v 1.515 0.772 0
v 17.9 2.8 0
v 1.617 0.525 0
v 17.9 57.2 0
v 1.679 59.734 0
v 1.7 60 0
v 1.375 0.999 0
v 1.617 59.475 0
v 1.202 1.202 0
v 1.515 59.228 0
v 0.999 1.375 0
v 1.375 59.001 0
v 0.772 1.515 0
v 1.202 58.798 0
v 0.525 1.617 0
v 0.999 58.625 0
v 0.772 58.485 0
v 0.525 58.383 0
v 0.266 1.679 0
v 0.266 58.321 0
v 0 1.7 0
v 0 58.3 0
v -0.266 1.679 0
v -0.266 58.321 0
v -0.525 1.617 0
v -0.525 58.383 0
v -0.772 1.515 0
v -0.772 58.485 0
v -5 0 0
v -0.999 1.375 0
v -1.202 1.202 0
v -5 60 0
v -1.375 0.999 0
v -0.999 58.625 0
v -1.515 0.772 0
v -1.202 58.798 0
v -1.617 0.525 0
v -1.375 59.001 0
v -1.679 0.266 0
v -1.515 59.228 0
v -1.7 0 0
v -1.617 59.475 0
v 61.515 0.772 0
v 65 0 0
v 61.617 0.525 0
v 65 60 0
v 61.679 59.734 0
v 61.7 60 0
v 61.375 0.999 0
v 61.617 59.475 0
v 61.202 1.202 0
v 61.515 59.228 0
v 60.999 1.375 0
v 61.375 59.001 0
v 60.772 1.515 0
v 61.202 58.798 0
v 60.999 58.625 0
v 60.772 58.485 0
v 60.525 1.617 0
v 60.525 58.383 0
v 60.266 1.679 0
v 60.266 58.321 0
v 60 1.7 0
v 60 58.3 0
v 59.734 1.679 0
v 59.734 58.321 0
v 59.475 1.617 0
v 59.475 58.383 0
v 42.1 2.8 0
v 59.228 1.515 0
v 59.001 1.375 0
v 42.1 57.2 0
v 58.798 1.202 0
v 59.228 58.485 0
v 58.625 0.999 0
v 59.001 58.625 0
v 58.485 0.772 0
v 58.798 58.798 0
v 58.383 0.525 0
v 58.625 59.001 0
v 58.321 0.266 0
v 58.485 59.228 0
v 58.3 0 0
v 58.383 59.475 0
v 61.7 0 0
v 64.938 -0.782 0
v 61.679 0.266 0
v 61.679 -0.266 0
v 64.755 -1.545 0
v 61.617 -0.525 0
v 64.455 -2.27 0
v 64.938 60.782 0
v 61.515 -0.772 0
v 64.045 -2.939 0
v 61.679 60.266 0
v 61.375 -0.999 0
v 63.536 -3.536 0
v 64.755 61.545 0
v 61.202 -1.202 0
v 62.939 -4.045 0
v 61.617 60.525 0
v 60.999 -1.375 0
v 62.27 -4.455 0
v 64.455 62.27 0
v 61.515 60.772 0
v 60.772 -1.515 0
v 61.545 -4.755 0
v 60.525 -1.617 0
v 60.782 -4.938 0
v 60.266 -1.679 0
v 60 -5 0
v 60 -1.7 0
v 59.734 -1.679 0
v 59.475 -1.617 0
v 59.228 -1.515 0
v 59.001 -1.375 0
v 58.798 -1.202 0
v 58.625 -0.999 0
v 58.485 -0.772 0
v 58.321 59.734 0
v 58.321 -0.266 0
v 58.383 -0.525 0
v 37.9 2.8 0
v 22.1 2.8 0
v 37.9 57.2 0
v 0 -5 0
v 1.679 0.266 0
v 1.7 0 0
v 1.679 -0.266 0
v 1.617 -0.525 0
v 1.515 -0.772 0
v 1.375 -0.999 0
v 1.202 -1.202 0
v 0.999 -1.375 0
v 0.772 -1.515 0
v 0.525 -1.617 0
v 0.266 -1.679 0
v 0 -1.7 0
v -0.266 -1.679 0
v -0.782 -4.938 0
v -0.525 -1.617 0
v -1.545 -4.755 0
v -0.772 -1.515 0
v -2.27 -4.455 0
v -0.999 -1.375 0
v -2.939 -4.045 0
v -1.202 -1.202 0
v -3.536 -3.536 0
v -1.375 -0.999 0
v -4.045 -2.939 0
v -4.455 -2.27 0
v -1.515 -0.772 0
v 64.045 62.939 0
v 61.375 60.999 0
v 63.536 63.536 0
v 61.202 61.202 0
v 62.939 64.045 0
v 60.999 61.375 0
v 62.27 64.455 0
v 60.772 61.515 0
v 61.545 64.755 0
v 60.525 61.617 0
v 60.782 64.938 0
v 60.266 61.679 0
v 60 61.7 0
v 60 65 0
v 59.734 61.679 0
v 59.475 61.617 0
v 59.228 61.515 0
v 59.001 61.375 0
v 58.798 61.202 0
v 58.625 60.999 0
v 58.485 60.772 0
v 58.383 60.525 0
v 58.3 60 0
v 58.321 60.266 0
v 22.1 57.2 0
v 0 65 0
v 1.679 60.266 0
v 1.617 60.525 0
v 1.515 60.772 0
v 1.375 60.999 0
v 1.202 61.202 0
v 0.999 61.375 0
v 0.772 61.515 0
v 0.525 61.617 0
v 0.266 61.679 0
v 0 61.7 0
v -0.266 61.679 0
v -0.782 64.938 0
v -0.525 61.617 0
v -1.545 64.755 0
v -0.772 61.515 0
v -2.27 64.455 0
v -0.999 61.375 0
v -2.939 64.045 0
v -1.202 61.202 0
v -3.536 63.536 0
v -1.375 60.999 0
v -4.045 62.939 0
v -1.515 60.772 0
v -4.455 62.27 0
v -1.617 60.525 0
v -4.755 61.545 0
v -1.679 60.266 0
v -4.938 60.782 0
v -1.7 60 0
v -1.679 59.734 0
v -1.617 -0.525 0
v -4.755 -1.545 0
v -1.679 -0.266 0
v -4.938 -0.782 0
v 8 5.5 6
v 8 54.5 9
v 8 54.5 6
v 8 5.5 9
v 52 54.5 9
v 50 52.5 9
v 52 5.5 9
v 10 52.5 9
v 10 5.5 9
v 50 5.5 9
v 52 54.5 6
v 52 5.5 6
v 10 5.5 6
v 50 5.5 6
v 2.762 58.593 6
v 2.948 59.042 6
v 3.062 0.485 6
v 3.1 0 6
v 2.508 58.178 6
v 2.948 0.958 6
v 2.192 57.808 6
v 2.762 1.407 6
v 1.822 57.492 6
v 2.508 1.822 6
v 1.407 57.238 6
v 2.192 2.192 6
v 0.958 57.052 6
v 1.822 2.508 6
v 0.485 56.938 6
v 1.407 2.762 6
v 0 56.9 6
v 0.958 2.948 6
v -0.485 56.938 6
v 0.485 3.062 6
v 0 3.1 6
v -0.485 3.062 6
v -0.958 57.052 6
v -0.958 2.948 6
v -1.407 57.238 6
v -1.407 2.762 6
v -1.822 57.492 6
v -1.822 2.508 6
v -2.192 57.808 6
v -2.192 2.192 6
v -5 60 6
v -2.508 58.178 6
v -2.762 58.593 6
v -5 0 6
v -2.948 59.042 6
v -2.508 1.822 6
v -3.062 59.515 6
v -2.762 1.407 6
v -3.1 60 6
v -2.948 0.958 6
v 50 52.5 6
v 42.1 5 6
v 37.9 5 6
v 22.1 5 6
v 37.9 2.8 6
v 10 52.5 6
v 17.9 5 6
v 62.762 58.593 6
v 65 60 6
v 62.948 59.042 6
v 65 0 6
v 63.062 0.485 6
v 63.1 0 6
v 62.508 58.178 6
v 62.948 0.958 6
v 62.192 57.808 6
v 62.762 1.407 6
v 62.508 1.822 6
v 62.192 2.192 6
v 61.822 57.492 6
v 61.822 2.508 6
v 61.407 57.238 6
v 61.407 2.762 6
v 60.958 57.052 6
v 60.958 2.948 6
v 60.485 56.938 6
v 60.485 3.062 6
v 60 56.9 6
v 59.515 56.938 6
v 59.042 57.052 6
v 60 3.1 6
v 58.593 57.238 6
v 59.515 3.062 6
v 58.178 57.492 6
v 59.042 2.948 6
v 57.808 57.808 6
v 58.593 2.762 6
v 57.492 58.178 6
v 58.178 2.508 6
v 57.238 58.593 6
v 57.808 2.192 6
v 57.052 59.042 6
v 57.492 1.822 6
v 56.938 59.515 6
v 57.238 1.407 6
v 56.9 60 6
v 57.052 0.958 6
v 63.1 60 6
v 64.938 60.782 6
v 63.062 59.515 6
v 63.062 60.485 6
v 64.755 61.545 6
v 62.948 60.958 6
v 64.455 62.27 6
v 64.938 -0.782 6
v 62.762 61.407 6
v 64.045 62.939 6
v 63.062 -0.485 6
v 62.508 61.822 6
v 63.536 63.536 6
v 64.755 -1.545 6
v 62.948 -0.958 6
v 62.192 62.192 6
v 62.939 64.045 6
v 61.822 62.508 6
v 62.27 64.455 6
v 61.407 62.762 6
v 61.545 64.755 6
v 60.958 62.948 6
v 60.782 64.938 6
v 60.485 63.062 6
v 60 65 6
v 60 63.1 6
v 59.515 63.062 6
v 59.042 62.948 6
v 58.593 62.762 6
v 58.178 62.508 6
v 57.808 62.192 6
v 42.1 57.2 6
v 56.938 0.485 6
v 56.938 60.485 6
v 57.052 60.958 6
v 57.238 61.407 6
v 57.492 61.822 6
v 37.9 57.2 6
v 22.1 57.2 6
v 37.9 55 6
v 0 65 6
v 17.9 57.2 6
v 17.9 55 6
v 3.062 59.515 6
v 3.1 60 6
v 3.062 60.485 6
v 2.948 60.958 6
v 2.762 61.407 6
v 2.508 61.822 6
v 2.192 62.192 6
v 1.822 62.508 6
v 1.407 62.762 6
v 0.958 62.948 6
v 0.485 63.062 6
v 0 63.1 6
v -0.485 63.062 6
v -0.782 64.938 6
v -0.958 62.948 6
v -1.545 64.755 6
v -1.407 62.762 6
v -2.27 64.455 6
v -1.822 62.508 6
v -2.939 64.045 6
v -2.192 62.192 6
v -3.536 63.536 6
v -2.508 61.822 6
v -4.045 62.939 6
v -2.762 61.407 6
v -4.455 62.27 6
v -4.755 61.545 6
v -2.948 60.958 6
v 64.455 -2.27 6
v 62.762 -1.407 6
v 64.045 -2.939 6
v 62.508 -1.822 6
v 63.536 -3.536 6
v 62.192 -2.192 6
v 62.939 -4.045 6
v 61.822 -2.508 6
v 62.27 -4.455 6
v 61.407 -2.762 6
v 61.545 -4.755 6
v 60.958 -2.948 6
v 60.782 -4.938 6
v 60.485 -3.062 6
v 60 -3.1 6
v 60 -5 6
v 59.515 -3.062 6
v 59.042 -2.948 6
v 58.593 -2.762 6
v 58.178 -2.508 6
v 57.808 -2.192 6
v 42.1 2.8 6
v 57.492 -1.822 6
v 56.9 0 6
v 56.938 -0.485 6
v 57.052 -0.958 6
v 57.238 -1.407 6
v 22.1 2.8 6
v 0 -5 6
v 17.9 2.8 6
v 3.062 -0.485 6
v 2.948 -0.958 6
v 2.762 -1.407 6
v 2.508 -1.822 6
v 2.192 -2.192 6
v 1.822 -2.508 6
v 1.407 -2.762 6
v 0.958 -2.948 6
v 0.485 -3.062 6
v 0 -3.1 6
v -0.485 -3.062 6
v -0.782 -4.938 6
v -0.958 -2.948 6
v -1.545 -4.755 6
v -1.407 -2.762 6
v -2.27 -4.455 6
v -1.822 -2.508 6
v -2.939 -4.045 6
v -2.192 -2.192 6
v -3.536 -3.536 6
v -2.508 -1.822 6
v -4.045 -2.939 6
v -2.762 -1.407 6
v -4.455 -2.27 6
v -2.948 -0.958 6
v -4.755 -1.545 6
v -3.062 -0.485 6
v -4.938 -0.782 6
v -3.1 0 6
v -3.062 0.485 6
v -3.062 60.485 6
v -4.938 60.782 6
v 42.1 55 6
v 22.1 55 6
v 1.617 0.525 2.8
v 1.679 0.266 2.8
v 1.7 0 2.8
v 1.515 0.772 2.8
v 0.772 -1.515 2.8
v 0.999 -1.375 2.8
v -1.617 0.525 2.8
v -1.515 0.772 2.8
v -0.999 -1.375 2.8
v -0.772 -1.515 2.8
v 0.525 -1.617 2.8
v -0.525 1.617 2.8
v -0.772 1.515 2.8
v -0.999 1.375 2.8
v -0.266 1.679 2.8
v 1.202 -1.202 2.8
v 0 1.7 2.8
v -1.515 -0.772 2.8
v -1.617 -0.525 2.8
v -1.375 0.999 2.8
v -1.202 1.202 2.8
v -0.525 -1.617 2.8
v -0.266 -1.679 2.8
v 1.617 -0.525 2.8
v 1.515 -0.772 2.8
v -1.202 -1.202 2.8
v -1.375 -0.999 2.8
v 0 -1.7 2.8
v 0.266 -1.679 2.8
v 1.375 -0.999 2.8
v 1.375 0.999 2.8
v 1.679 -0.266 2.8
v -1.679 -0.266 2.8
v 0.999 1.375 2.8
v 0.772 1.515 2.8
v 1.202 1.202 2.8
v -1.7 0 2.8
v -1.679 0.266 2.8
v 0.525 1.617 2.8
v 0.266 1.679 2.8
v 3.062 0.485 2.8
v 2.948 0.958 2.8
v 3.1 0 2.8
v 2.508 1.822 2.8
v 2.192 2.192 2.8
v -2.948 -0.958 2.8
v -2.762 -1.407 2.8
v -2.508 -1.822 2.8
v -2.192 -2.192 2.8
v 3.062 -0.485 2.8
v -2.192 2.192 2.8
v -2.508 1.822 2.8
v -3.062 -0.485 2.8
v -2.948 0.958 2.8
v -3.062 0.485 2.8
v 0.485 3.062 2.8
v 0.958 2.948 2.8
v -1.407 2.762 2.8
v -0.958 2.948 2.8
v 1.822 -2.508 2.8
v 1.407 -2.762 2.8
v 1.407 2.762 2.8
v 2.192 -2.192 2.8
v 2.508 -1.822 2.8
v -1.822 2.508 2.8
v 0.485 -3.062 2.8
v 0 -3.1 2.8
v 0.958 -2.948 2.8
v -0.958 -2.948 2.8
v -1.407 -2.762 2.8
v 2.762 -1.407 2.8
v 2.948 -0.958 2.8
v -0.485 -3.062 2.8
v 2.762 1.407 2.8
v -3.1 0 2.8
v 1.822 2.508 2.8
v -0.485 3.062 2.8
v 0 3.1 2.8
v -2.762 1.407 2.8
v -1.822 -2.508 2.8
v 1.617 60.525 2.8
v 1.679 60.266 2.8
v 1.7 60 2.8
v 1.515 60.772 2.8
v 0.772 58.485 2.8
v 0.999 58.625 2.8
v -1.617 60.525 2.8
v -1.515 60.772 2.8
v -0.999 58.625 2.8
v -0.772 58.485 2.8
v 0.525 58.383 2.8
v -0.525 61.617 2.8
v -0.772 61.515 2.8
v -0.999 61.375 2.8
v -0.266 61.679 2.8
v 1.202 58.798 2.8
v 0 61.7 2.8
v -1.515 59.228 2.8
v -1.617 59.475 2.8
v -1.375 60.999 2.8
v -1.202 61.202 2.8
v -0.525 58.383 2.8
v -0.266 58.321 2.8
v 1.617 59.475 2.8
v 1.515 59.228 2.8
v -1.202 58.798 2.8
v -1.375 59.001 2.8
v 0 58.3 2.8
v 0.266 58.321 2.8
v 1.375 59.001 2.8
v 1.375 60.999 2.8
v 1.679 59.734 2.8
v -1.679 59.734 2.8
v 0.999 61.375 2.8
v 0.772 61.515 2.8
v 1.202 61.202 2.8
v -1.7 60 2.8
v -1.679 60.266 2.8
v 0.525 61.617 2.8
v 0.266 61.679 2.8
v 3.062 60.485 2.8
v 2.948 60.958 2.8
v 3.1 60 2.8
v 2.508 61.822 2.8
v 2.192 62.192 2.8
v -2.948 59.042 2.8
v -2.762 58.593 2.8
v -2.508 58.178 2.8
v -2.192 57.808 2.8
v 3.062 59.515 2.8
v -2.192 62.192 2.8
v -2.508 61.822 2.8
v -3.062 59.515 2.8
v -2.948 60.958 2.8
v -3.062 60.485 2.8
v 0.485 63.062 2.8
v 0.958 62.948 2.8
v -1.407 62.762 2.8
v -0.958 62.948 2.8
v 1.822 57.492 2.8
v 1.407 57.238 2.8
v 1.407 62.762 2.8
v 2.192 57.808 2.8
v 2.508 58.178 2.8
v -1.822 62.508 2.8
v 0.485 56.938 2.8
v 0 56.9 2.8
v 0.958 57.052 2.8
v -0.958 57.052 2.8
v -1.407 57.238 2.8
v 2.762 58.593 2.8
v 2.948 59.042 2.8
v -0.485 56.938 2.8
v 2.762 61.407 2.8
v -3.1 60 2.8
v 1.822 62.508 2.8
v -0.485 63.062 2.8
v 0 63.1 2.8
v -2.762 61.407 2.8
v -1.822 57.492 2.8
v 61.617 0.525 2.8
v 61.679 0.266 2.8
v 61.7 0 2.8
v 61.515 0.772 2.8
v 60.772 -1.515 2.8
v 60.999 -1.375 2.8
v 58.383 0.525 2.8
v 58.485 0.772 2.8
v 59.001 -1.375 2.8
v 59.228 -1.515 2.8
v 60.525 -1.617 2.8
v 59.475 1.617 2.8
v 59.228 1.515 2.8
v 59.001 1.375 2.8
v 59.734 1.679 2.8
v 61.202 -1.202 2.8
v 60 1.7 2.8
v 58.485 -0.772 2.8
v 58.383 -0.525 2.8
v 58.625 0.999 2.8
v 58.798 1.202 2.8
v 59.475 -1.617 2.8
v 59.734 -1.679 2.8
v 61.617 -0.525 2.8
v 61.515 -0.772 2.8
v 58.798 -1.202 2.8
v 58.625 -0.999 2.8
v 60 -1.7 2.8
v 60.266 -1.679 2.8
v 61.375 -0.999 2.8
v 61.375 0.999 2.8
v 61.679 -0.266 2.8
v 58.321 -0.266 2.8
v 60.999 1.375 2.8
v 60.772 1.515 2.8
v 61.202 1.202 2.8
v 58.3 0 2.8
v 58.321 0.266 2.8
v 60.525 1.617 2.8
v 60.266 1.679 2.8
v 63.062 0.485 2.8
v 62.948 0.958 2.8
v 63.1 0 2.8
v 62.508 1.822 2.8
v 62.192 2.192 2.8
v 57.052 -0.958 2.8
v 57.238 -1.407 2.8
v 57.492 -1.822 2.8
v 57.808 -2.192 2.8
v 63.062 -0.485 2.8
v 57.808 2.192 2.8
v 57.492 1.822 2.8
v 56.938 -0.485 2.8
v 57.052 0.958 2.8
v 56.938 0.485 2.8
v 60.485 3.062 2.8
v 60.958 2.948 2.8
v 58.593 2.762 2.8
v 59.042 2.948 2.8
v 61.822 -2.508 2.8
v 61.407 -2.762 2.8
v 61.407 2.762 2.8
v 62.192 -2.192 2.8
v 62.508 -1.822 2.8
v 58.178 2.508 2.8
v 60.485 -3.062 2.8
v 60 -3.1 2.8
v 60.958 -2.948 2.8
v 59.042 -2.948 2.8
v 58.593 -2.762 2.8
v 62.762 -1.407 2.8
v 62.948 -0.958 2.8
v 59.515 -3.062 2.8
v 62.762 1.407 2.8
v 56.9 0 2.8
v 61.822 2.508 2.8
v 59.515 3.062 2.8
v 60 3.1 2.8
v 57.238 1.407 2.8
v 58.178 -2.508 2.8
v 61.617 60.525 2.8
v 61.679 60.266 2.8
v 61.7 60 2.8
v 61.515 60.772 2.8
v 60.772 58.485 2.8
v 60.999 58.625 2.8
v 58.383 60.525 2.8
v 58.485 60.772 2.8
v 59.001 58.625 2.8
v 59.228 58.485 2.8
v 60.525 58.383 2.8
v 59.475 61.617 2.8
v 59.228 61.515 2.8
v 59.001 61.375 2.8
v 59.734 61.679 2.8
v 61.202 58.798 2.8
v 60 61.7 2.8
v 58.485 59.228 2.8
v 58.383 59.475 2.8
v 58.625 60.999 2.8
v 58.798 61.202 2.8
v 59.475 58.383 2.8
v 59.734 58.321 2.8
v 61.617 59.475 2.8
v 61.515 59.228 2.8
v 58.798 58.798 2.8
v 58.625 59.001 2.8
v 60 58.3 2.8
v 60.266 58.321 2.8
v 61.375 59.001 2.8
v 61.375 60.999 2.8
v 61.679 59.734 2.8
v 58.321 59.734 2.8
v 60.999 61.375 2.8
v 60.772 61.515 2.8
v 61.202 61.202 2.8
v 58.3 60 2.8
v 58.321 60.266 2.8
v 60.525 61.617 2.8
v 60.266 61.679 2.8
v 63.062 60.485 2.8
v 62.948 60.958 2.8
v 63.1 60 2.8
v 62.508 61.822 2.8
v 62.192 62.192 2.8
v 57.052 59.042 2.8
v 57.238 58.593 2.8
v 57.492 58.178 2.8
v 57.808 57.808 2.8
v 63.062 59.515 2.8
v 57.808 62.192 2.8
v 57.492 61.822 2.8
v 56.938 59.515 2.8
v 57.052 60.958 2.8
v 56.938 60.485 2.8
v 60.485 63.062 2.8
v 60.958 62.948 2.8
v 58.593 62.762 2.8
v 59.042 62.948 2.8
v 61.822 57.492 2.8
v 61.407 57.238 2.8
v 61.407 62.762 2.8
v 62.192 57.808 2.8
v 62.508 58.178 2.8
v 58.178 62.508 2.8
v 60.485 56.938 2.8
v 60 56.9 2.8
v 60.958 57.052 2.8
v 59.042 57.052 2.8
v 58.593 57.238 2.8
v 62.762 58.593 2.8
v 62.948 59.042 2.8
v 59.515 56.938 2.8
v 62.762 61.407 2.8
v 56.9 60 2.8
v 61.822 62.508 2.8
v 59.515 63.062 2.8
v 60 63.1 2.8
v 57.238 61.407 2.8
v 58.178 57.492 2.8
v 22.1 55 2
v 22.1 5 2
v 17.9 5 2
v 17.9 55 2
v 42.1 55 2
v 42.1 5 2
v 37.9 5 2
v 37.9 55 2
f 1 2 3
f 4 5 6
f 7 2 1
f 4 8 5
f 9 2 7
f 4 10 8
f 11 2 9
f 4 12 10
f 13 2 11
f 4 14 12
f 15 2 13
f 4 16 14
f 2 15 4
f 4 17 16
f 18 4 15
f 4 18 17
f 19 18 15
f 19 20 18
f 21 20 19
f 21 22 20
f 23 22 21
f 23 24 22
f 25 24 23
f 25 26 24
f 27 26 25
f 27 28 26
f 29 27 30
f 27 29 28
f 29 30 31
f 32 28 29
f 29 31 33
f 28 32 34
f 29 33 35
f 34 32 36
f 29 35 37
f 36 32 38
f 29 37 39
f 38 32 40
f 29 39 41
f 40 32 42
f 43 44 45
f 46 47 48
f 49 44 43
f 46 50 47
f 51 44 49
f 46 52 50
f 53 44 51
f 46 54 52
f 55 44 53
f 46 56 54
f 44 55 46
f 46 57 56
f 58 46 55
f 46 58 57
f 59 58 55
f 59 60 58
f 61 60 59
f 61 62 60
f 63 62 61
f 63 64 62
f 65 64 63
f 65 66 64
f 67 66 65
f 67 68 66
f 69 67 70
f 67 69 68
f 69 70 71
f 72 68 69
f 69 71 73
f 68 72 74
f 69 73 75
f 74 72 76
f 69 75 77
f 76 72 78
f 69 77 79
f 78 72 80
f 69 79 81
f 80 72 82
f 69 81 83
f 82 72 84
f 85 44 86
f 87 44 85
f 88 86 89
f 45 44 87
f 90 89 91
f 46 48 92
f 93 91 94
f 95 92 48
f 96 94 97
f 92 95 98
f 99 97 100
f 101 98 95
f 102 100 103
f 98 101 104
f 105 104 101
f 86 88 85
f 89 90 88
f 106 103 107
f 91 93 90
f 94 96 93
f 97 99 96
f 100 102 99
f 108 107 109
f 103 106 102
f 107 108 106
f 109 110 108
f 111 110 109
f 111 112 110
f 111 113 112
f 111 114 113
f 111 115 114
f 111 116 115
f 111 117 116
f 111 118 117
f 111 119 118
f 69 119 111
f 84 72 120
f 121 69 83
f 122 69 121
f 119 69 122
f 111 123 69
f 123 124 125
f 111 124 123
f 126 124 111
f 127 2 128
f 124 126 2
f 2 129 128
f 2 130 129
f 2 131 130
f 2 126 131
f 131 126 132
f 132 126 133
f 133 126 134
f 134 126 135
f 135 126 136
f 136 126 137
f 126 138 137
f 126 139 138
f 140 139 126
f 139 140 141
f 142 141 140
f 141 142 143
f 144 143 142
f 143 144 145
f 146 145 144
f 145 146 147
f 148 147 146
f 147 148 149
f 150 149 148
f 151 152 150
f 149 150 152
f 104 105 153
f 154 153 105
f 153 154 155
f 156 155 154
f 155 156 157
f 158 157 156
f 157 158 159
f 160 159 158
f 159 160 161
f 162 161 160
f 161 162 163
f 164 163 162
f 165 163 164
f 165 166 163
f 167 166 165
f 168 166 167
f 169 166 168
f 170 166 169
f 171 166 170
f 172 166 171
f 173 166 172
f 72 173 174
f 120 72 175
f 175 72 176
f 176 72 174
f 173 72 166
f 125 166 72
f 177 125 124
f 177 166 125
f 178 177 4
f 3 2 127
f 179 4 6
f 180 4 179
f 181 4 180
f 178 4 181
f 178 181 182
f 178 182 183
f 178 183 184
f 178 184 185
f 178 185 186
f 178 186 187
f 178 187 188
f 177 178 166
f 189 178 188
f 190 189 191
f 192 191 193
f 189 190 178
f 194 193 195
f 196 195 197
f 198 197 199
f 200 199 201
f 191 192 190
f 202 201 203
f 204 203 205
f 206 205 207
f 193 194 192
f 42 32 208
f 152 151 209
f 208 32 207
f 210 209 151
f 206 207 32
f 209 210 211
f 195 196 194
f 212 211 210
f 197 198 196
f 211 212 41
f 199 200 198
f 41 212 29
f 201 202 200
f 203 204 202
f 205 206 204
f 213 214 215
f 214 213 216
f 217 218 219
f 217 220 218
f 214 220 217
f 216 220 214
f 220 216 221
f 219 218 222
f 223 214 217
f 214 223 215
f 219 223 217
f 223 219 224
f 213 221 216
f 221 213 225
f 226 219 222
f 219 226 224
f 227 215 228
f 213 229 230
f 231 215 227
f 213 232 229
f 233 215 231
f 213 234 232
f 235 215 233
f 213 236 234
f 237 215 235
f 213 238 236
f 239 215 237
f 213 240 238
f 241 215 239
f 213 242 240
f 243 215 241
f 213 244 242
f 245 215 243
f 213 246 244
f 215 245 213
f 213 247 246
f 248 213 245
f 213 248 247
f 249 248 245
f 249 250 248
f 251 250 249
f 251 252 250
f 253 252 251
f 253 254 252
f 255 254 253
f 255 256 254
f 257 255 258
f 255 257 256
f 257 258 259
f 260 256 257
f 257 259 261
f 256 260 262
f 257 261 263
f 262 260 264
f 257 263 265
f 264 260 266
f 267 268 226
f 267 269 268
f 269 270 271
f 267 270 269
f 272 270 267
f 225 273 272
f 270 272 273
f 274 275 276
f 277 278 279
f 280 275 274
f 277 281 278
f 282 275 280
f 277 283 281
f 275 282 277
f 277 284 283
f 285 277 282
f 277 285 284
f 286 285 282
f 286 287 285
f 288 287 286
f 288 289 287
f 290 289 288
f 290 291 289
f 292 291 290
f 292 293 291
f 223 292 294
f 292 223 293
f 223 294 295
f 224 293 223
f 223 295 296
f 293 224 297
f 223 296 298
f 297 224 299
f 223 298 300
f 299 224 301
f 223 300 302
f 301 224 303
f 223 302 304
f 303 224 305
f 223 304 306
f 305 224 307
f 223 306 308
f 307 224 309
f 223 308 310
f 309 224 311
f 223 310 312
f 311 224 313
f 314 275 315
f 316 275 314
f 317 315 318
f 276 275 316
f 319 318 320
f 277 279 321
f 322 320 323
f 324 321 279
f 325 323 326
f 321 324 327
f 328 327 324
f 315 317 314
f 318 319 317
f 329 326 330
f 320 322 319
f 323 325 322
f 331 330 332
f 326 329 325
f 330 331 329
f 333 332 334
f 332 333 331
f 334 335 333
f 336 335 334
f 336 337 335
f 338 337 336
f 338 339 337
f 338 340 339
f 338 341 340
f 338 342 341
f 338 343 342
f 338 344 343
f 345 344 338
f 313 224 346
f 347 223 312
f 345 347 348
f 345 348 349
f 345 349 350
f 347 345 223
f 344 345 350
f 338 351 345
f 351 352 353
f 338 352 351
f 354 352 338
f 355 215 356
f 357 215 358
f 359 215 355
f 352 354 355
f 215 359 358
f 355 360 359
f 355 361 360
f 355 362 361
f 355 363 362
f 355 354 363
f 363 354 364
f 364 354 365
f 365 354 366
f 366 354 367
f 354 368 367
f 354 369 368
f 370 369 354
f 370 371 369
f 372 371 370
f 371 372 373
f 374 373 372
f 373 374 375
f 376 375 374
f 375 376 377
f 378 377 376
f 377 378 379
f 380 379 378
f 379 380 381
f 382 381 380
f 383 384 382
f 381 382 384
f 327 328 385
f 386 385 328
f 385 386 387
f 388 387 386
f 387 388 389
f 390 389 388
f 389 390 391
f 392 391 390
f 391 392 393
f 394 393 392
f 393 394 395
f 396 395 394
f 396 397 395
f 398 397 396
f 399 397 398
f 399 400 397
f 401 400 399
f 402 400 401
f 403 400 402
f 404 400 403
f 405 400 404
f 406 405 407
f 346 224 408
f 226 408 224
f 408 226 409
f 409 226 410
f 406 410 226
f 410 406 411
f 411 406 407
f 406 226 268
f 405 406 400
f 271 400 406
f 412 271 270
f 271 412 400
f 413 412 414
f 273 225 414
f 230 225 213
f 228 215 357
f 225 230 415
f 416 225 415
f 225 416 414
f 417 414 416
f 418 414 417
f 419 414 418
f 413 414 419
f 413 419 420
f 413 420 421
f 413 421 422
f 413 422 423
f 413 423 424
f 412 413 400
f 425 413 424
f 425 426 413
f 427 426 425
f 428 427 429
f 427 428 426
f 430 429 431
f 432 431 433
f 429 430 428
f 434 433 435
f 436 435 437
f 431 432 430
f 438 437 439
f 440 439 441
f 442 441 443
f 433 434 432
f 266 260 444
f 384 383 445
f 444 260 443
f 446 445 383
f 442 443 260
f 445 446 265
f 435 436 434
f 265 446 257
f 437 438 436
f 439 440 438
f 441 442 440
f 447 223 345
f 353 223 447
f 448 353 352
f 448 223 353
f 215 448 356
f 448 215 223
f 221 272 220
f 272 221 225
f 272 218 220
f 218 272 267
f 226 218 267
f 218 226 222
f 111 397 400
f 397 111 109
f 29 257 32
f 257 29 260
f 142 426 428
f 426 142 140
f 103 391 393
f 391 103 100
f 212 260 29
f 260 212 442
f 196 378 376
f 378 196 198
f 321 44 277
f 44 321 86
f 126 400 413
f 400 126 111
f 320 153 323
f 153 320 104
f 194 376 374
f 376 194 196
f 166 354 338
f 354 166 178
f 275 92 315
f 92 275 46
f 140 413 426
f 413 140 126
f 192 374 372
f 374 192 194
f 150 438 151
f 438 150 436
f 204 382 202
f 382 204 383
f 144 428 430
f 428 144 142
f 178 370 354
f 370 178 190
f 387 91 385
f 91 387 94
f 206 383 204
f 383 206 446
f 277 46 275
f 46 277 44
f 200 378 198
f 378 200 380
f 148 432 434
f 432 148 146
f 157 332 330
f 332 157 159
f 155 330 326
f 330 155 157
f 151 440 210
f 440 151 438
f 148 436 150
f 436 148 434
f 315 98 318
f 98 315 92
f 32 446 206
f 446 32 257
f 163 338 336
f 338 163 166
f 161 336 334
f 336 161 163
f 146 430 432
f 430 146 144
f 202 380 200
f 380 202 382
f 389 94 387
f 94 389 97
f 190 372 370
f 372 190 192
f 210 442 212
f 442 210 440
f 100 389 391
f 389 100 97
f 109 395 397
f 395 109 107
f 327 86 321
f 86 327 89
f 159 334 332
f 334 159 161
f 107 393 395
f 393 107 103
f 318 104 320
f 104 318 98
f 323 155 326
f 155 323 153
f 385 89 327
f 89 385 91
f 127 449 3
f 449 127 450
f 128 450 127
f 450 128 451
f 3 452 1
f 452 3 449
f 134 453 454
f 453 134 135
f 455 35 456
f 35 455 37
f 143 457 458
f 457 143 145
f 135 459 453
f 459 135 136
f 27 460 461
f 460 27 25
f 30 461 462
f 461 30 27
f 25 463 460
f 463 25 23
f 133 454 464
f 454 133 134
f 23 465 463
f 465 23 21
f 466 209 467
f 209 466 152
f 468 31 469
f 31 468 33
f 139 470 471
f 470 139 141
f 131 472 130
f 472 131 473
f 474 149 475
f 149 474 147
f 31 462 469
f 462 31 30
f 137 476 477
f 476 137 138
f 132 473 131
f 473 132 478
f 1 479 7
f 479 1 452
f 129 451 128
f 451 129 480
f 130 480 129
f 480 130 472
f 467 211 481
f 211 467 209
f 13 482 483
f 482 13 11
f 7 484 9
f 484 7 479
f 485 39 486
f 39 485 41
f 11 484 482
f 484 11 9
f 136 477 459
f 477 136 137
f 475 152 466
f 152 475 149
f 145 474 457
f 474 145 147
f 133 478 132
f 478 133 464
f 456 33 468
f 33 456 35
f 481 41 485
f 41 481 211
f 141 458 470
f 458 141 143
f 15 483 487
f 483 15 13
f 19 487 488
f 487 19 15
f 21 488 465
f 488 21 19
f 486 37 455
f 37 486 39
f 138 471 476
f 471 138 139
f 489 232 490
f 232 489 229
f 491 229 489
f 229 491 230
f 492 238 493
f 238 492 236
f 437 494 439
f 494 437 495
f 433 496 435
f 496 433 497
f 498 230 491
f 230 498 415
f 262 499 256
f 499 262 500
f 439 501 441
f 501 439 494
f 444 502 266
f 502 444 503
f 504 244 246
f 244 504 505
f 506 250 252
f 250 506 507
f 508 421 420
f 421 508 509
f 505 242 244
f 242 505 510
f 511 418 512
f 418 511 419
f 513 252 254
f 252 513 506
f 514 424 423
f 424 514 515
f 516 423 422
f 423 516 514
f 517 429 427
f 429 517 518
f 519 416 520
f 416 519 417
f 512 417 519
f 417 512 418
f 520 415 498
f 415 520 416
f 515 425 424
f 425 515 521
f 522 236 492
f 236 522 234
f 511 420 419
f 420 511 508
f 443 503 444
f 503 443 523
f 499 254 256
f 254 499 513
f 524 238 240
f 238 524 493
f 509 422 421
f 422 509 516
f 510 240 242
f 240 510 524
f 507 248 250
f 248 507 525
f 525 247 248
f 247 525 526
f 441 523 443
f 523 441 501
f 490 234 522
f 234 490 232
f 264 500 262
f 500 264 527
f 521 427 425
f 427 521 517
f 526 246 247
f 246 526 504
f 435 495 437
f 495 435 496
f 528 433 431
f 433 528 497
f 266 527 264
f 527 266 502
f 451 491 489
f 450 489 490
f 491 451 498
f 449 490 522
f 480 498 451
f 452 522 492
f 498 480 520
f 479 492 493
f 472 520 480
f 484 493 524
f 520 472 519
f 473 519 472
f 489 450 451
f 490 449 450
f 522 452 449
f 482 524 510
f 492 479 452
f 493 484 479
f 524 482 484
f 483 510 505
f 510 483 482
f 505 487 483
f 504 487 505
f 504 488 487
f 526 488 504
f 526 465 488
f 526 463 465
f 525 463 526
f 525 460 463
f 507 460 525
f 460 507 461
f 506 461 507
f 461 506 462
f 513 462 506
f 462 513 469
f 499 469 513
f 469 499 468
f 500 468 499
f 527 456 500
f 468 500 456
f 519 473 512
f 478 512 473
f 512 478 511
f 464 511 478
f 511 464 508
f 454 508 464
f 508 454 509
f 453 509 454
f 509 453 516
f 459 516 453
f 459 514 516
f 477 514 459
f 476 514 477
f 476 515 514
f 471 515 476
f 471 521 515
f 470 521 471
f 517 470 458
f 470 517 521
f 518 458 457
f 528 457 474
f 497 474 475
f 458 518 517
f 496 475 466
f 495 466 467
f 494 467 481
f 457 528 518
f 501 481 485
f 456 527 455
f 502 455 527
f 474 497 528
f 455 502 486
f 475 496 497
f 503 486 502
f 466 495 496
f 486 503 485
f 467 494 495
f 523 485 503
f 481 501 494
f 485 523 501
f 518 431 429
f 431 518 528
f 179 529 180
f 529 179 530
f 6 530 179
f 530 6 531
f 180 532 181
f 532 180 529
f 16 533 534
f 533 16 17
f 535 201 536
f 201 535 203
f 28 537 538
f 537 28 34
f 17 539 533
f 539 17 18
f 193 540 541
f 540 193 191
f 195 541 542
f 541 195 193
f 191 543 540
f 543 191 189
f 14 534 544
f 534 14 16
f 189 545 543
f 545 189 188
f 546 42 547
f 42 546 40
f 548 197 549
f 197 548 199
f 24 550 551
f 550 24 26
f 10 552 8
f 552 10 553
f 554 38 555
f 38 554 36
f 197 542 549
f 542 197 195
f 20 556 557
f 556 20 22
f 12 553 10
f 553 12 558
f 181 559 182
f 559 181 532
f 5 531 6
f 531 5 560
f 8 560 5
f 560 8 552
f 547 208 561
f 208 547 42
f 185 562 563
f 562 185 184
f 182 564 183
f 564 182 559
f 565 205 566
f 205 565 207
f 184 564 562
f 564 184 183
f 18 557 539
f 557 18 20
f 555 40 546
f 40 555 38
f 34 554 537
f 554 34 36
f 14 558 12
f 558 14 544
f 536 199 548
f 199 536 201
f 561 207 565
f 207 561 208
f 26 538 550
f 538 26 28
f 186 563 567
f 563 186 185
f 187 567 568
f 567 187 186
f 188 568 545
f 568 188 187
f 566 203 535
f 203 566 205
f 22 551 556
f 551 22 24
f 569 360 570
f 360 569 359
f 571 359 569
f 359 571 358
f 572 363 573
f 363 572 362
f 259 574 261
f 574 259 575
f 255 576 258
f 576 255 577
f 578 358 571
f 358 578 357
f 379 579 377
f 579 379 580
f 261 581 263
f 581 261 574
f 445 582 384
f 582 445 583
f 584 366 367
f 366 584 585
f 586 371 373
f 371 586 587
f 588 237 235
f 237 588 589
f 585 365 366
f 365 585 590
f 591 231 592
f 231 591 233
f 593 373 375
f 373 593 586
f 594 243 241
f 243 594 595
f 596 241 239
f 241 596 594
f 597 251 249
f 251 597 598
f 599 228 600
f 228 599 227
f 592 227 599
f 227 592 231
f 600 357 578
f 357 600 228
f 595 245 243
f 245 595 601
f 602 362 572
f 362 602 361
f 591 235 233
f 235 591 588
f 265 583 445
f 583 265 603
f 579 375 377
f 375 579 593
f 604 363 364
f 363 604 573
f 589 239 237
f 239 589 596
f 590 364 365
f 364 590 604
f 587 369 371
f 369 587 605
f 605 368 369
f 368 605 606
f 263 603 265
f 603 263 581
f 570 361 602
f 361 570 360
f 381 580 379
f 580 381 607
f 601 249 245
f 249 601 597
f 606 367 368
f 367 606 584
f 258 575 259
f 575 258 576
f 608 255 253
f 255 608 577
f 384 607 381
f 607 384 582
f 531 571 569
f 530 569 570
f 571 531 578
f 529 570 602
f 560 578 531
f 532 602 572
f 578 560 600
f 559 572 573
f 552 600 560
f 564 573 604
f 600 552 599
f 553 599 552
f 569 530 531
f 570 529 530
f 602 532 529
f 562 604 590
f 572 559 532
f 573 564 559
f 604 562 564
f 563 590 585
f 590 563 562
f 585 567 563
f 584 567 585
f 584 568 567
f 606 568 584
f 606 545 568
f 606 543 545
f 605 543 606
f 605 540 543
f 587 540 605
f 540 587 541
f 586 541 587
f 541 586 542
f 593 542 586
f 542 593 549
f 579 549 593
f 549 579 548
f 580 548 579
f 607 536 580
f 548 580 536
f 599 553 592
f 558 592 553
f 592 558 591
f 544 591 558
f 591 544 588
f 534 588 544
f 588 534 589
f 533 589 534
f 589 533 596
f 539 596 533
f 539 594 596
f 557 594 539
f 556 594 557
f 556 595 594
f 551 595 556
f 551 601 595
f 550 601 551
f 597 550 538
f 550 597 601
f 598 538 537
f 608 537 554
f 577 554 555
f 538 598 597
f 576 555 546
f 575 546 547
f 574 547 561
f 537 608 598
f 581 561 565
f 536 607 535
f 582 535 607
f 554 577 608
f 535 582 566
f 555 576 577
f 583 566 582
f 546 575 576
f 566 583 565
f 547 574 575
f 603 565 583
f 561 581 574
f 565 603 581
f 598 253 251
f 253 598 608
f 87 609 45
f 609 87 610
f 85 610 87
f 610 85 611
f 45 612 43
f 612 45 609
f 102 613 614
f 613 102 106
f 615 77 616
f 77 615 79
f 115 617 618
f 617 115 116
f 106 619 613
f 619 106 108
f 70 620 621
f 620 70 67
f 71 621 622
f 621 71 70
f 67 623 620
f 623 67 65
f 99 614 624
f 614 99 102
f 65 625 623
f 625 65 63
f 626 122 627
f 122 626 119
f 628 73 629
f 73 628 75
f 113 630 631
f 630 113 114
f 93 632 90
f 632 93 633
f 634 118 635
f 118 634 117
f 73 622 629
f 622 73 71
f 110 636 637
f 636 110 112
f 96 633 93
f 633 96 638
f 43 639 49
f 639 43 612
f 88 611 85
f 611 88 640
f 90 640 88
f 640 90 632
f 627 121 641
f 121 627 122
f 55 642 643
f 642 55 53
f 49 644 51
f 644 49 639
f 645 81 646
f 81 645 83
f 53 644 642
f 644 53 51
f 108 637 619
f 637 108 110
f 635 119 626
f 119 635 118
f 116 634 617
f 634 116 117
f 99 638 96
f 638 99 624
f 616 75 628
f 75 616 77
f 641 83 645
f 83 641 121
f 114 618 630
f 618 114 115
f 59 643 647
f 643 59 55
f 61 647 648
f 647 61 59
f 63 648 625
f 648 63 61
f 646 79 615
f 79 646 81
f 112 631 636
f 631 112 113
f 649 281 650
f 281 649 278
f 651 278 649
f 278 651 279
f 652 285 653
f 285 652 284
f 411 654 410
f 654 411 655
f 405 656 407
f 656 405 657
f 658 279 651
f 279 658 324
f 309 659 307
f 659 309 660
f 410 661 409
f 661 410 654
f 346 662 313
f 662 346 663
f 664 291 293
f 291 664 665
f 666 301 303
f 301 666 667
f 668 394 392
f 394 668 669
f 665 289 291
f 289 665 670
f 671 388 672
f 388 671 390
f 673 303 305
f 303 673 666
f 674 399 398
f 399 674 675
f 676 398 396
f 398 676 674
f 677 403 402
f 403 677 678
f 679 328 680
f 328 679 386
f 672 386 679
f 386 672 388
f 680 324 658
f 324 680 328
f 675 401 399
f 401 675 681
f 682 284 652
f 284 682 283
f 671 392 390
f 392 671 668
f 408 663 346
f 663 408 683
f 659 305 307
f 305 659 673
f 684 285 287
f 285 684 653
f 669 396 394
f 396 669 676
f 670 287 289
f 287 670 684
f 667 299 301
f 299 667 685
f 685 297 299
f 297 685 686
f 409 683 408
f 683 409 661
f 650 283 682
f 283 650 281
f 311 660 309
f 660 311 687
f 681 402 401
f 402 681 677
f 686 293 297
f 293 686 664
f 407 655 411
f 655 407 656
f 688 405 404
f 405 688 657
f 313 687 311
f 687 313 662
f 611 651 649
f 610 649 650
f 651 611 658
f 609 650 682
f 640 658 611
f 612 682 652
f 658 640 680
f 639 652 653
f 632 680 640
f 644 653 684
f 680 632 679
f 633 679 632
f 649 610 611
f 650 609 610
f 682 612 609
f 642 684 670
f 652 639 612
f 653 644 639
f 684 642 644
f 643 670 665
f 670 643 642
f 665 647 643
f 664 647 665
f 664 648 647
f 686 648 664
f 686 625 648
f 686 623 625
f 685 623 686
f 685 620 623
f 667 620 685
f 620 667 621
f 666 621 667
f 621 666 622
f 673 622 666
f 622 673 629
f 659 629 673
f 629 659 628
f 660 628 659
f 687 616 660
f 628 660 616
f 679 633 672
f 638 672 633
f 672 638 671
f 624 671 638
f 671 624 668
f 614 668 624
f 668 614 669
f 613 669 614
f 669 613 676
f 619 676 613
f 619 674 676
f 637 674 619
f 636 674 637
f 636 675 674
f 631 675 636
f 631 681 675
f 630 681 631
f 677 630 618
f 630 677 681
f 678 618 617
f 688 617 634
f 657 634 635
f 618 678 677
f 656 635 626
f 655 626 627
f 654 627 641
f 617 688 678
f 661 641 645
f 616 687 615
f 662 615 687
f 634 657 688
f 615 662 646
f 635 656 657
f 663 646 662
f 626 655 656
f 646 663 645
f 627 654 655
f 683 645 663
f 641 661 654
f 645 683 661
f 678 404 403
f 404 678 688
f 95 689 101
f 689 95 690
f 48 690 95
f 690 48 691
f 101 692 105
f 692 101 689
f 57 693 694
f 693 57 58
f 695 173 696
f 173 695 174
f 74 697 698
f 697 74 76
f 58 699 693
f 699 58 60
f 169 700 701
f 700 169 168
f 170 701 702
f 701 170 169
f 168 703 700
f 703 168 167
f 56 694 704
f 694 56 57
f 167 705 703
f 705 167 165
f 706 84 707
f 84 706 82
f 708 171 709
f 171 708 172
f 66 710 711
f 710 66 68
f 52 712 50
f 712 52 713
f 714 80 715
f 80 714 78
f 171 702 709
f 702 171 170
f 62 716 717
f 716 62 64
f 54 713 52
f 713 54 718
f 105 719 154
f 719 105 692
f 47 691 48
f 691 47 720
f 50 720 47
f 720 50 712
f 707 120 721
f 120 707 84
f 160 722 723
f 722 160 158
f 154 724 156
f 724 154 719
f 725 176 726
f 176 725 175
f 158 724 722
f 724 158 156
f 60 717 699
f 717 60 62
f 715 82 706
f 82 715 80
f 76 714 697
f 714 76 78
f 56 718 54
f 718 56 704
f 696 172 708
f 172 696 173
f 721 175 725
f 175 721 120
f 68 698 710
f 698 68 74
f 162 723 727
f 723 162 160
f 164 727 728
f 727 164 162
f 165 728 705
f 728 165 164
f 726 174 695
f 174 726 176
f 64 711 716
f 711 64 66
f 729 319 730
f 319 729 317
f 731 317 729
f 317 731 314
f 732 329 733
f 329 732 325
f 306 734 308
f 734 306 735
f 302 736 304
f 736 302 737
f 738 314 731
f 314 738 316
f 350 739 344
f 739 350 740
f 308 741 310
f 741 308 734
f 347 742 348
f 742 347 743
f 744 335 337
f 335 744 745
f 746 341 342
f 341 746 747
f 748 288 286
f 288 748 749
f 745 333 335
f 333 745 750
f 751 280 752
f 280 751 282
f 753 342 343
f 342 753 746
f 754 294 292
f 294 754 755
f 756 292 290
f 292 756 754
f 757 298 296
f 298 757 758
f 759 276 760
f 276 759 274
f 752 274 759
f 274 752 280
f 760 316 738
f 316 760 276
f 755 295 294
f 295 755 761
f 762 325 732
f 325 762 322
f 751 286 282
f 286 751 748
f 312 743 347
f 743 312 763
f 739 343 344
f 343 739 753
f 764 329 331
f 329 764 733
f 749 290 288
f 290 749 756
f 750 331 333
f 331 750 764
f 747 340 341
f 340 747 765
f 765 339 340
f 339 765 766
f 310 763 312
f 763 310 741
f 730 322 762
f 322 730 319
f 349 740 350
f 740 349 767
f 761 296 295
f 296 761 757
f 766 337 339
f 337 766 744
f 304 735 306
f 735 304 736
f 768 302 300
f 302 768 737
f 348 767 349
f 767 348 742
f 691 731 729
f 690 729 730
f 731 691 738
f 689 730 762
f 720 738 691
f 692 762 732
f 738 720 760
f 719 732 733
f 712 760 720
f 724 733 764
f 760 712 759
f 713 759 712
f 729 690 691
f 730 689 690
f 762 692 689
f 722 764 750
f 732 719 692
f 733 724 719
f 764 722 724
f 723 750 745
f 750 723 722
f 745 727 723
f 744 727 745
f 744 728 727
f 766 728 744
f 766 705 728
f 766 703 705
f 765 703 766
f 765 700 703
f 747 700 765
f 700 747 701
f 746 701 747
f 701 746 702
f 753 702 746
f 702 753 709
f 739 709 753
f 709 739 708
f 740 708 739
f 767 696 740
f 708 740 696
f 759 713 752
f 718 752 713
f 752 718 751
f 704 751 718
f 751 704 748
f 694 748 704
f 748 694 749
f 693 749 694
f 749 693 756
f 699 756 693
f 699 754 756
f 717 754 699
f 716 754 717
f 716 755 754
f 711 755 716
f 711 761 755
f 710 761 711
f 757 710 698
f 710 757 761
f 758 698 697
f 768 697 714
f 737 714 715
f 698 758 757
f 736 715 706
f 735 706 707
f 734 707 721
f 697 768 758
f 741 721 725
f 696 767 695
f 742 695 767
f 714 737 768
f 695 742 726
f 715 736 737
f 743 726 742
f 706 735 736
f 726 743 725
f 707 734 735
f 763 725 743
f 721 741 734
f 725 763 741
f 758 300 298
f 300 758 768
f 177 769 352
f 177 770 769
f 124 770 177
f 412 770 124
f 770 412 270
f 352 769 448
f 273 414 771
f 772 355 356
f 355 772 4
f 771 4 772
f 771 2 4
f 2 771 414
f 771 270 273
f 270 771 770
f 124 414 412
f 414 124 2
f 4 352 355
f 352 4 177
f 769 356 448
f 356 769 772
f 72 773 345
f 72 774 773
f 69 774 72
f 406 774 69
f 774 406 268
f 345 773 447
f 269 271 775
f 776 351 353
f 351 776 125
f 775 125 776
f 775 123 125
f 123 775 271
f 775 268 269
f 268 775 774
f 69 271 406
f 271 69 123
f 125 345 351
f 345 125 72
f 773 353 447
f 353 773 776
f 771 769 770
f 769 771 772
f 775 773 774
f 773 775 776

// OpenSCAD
include <../lib/apache-case-modules-lib.scad>;
$fn = 40;
charge_tray_print();
